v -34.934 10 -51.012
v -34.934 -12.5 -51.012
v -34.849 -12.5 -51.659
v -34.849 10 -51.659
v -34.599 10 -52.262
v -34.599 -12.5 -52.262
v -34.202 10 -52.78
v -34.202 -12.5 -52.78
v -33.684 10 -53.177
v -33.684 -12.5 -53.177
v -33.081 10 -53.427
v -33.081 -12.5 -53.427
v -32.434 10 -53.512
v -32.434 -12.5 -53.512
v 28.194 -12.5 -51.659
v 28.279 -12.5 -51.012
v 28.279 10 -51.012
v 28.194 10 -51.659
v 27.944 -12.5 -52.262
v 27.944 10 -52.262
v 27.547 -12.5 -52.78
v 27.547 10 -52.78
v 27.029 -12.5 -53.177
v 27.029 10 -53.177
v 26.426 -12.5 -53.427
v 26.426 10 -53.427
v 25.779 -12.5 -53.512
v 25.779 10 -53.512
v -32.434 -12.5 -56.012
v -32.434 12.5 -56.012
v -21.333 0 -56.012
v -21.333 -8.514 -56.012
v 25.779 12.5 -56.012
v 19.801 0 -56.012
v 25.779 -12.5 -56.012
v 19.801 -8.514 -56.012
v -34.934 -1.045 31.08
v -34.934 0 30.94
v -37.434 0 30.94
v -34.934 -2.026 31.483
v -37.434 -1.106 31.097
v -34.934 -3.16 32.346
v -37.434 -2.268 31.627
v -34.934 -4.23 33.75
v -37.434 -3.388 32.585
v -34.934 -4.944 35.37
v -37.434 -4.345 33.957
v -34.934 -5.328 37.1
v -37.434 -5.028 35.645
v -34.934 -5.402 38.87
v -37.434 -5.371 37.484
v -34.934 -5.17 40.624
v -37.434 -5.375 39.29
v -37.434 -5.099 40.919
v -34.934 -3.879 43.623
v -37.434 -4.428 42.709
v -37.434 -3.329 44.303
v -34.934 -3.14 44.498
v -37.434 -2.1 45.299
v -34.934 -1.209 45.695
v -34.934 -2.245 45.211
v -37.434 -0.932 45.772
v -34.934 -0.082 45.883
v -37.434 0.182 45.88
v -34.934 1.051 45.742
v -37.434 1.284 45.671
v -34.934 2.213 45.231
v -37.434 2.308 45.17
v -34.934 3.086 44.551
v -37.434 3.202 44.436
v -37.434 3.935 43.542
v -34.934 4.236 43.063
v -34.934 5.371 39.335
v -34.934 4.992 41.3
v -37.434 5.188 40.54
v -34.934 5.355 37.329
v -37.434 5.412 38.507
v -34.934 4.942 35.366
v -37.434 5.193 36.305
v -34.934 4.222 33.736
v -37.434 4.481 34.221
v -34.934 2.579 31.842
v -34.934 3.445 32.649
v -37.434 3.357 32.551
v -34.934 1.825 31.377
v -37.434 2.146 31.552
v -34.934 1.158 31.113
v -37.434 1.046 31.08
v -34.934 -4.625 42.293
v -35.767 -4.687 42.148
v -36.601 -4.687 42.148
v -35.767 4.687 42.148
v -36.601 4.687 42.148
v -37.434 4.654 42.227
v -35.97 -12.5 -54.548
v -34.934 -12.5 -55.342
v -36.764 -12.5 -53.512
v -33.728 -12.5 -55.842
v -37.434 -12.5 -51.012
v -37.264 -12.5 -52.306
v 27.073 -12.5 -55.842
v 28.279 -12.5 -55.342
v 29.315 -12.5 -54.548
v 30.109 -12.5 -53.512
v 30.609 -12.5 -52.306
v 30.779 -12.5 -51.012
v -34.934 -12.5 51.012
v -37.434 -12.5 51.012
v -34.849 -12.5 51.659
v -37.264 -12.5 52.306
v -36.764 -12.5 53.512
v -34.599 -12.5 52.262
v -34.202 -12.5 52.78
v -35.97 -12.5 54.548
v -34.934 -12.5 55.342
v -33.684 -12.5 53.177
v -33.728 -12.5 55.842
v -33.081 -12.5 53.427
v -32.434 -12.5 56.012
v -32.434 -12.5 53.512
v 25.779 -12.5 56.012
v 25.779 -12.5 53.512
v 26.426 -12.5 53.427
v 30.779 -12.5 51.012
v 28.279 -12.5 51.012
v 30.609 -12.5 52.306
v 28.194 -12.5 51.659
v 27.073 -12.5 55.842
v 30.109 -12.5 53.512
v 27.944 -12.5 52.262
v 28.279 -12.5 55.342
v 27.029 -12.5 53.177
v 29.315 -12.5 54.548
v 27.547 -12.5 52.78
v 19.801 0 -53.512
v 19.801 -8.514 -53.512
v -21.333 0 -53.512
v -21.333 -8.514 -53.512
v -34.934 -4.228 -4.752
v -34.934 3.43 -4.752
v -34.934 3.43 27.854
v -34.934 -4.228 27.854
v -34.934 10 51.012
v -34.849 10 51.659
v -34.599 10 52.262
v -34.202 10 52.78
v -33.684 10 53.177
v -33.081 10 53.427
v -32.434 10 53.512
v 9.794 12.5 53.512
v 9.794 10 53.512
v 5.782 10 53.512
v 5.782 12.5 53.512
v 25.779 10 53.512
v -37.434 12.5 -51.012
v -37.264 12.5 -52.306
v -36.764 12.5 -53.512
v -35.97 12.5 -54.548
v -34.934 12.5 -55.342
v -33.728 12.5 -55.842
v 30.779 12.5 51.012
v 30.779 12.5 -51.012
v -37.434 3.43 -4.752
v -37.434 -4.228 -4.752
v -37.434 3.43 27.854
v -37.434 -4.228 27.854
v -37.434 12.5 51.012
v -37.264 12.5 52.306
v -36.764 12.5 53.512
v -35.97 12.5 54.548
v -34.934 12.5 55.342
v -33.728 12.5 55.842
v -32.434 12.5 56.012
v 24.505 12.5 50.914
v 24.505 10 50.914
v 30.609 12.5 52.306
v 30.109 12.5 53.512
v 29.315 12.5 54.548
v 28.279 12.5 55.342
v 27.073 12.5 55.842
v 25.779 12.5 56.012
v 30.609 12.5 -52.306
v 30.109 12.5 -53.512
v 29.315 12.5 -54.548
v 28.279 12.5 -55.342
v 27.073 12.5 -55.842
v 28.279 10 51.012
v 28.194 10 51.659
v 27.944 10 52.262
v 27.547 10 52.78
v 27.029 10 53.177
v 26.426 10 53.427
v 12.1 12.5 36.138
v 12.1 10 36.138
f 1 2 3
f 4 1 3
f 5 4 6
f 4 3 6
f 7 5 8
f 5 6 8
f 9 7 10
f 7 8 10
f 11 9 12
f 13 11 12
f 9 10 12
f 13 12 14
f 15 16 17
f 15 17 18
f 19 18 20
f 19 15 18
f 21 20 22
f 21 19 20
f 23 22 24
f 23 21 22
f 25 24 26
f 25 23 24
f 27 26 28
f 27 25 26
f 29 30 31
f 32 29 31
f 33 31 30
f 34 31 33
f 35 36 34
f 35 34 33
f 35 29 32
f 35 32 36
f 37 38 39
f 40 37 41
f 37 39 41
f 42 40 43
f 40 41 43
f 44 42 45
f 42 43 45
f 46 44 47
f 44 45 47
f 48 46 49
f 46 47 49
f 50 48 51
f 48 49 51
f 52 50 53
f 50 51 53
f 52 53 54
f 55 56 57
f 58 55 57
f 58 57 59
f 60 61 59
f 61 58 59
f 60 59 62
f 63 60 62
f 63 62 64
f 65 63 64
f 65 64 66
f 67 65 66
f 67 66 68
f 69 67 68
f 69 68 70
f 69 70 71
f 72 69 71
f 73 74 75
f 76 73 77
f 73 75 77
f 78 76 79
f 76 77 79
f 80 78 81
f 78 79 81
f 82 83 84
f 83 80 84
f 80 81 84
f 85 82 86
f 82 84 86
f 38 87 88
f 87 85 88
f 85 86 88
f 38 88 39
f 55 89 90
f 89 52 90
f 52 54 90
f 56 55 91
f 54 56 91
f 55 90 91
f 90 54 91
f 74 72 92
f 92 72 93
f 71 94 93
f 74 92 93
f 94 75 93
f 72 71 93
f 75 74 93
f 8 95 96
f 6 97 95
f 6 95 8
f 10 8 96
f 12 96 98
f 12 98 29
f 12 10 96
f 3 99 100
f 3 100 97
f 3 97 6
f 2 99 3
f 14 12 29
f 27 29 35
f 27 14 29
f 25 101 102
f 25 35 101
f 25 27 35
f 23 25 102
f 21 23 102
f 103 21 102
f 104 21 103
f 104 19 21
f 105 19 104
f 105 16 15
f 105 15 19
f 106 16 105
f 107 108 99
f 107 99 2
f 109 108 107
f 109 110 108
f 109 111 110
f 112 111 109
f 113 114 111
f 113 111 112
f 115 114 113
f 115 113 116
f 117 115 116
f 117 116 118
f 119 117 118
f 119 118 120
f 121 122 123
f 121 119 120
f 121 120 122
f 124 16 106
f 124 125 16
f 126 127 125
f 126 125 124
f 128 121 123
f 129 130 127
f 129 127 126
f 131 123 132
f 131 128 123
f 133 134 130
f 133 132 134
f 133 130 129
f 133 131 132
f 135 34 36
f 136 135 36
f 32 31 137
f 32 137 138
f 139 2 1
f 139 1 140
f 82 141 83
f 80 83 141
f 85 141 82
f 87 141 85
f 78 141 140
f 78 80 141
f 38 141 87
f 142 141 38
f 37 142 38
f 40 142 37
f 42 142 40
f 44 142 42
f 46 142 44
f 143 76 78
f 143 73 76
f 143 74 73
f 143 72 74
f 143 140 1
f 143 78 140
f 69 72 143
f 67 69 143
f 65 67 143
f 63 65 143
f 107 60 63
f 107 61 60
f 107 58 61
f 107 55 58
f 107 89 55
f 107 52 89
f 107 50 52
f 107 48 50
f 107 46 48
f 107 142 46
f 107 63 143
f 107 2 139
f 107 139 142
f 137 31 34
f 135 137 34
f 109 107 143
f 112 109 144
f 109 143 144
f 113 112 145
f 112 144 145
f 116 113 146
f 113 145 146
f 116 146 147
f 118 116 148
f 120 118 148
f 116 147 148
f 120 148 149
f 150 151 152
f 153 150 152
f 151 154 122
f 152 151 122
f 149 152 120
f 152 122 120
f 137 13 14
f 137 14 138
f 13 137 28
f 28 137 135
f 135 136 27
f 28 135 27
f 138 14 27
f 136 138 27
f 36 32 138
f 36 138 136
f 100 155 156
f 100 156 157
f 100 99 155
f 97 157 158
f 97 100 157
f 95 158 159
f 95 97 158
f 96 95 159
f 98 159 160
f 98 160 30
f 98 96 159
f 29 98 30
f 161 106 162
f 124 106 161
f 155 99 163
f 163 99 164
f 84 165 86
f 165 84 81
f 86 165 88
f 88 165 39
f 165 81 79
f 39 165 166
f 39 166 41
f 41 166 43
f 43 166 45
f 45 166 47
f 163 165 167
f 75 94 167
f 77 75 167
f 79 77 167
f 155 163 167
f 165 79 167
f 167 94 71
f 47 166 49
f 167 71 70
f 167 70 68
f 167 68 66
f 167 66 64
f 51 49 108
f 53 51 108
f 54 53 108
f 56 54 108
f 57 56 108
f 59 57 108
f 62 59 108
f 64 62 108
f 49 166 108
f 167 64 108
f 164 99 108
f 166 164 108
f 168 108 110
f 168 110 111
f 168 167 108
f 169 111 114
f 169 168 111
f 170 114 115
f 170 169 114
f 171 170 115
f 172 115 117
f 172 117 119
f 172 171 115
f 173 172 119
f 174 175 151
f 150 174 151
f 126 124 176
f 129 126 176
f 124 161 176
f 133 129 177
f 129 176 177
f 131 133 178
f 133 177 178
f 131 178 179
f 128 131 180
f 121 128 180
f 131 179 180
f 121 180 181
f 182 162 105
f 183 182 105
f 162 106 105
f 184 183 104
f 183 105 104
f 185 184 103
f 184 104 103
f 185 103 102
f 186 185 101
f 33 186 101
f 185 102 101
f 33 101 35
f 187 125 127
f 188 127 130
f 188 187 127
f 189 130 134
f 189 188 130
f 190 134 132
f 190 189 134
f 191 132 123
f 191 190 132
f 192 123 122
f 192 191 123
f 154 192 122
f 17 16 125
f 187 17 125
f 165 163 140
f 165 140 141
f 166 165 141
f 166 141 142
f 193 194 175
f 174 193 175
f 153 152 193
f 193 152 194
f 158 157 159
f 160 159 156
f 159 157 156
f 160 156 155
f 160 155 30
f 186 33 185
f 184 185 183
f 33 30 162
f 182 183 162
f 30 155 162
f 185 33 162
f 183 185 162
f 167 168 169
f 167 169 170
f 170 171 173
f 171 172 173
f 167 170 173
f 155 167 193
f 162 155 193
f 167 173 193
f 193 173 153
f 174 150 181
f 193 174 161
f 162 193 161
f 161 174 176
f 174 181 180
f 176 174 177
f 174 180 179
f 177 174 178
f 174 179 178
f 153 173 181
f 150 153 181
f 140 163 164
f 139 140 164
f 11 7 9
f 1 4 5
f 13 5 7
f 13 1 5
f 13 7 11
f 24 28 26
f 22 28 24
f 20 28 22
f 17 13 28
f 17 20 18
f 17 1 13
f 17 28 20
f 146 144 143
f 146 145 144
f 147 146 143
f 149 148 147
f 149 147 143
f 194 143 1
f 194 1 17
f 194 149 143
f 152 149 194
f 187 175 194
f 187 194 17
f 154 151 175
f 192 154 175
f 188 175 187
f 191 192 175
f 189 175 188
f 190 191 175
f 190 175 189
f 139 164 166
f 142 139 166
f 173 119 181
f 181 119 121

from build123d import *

# Parameters (mm, degrees)
F0_W      = 68.2130311616
F0_H      = 112.0246499777
F1_DEPTH  = 12.5
F2_R      = 5
F3_T      = -2.5
F5_DEPTH  = 12.5
F7_DEPTH  = 12.5
F8_W      = 41.1343723536
F8_H      = 8.5135642439
F9_DEPTH  = 12.5
F10_W     = 7.6575540006
F10_H     = 32.6063591056
F11_DEPTH = 12.5


with BuildPart() as f1:
    # F0 (on Front) → F1 (new body, symmetric)
    with BuildSketch(Plane.XZ):
        with Locations((-3.3274649177, 0)):
            Rectangle(F0_W, F0_H)
    extrude(amount=F1_DEPTH, both=True)

    # F2
    f2_edges = [f1.edges().sort_by_distance(p)[0] for p in [
        (-37.43398, 0, 56.012325),
        (30.779051, 0, 56.012325),
        (30.779051, 0, -56.012325),
        (-37.43398, 0, -56.012325),
    ]]
    fillet(f2_edges, radius=F2_R)

    # F3
    f3_openings = [f1.faces().sort_by_distance(p)[0] for p in [
        (-3.327465, -12.5, 0),
    ]]
    offset(amount=F3_T, openings=f3_openings)

    # F4 (on face) → F5 (cut, symmetric)
    with BuildSketch(Plane.XZ.offset(-10)):
        Polygon((5.7816317596, 53.5123249888), (12.0995264448, 36.138133153), (24.5052874088, 50.9139038622), (9.7942447614, 53.5123249888), align=None)
    extrude(amount=F5_DEPTH, both=True, mode=Mode.SUBTRACT)

    # F6 (on face) → F7 (cut, symmetric)
    with BuildSketch(Plane(origin=(-37.4339804985, 0, 0), x_dir=(0, -1, 0), z_dir=(-1, 0, 0))):
        with BuildLine():
            add(Edge.make_bspline(
                [(0, 30.9395752847), (9.3745925943, 30.9395752847), (4.6872962971, 42.1479567885), (0, 53.3563382924), (-4.6872962971, 42.1479567885), (-9.3745925943, 30.9395752847), (0, 30.9395752847)],
                knots=[0, 0, 0, 2.0943951024, 2.0943951024, 4.1887902048, 4.1887902048, 6.2831853072, 6.2831853072, 6.2831853072], degree=2, weights=[1, 0.5, 1, 0.5, 1, 0.5, 1]))
        make_face()
    extrude(amount=F7_DEPTH, both=True, mode=Mode.SUBTRACT)

    # F8 (on face) → F9 (cut, symmetric)
    with BuildSketch(Plane(origin=(0, 0, -56.0123249888), x_dir=(1, 0, 0), z_dir=(0, 0, -1))):
        with Locations((-0.7663033903, 4.256782122)):
            Rectangle(F8_W, F8_H)
    extrude(amount=F9_DEPTH, both=True, mode=Mode.SUBTRACT)

    # F10 (on face) → F11 (cut, symmetric)
    with BuildSketch(Plane(origin=(-37.4339804985, 0, 0), x_dir=(0, -1, 0), z_dir=(-1, 0, 0))):
        with Locations((0.3990856931, 11.5511289332)):
            Rectangle(F10_W, F10_H)
    extrude(amount=F11_DEPTH, both=True, mode=Mode.SUBTRACT)


solid = f1.part
